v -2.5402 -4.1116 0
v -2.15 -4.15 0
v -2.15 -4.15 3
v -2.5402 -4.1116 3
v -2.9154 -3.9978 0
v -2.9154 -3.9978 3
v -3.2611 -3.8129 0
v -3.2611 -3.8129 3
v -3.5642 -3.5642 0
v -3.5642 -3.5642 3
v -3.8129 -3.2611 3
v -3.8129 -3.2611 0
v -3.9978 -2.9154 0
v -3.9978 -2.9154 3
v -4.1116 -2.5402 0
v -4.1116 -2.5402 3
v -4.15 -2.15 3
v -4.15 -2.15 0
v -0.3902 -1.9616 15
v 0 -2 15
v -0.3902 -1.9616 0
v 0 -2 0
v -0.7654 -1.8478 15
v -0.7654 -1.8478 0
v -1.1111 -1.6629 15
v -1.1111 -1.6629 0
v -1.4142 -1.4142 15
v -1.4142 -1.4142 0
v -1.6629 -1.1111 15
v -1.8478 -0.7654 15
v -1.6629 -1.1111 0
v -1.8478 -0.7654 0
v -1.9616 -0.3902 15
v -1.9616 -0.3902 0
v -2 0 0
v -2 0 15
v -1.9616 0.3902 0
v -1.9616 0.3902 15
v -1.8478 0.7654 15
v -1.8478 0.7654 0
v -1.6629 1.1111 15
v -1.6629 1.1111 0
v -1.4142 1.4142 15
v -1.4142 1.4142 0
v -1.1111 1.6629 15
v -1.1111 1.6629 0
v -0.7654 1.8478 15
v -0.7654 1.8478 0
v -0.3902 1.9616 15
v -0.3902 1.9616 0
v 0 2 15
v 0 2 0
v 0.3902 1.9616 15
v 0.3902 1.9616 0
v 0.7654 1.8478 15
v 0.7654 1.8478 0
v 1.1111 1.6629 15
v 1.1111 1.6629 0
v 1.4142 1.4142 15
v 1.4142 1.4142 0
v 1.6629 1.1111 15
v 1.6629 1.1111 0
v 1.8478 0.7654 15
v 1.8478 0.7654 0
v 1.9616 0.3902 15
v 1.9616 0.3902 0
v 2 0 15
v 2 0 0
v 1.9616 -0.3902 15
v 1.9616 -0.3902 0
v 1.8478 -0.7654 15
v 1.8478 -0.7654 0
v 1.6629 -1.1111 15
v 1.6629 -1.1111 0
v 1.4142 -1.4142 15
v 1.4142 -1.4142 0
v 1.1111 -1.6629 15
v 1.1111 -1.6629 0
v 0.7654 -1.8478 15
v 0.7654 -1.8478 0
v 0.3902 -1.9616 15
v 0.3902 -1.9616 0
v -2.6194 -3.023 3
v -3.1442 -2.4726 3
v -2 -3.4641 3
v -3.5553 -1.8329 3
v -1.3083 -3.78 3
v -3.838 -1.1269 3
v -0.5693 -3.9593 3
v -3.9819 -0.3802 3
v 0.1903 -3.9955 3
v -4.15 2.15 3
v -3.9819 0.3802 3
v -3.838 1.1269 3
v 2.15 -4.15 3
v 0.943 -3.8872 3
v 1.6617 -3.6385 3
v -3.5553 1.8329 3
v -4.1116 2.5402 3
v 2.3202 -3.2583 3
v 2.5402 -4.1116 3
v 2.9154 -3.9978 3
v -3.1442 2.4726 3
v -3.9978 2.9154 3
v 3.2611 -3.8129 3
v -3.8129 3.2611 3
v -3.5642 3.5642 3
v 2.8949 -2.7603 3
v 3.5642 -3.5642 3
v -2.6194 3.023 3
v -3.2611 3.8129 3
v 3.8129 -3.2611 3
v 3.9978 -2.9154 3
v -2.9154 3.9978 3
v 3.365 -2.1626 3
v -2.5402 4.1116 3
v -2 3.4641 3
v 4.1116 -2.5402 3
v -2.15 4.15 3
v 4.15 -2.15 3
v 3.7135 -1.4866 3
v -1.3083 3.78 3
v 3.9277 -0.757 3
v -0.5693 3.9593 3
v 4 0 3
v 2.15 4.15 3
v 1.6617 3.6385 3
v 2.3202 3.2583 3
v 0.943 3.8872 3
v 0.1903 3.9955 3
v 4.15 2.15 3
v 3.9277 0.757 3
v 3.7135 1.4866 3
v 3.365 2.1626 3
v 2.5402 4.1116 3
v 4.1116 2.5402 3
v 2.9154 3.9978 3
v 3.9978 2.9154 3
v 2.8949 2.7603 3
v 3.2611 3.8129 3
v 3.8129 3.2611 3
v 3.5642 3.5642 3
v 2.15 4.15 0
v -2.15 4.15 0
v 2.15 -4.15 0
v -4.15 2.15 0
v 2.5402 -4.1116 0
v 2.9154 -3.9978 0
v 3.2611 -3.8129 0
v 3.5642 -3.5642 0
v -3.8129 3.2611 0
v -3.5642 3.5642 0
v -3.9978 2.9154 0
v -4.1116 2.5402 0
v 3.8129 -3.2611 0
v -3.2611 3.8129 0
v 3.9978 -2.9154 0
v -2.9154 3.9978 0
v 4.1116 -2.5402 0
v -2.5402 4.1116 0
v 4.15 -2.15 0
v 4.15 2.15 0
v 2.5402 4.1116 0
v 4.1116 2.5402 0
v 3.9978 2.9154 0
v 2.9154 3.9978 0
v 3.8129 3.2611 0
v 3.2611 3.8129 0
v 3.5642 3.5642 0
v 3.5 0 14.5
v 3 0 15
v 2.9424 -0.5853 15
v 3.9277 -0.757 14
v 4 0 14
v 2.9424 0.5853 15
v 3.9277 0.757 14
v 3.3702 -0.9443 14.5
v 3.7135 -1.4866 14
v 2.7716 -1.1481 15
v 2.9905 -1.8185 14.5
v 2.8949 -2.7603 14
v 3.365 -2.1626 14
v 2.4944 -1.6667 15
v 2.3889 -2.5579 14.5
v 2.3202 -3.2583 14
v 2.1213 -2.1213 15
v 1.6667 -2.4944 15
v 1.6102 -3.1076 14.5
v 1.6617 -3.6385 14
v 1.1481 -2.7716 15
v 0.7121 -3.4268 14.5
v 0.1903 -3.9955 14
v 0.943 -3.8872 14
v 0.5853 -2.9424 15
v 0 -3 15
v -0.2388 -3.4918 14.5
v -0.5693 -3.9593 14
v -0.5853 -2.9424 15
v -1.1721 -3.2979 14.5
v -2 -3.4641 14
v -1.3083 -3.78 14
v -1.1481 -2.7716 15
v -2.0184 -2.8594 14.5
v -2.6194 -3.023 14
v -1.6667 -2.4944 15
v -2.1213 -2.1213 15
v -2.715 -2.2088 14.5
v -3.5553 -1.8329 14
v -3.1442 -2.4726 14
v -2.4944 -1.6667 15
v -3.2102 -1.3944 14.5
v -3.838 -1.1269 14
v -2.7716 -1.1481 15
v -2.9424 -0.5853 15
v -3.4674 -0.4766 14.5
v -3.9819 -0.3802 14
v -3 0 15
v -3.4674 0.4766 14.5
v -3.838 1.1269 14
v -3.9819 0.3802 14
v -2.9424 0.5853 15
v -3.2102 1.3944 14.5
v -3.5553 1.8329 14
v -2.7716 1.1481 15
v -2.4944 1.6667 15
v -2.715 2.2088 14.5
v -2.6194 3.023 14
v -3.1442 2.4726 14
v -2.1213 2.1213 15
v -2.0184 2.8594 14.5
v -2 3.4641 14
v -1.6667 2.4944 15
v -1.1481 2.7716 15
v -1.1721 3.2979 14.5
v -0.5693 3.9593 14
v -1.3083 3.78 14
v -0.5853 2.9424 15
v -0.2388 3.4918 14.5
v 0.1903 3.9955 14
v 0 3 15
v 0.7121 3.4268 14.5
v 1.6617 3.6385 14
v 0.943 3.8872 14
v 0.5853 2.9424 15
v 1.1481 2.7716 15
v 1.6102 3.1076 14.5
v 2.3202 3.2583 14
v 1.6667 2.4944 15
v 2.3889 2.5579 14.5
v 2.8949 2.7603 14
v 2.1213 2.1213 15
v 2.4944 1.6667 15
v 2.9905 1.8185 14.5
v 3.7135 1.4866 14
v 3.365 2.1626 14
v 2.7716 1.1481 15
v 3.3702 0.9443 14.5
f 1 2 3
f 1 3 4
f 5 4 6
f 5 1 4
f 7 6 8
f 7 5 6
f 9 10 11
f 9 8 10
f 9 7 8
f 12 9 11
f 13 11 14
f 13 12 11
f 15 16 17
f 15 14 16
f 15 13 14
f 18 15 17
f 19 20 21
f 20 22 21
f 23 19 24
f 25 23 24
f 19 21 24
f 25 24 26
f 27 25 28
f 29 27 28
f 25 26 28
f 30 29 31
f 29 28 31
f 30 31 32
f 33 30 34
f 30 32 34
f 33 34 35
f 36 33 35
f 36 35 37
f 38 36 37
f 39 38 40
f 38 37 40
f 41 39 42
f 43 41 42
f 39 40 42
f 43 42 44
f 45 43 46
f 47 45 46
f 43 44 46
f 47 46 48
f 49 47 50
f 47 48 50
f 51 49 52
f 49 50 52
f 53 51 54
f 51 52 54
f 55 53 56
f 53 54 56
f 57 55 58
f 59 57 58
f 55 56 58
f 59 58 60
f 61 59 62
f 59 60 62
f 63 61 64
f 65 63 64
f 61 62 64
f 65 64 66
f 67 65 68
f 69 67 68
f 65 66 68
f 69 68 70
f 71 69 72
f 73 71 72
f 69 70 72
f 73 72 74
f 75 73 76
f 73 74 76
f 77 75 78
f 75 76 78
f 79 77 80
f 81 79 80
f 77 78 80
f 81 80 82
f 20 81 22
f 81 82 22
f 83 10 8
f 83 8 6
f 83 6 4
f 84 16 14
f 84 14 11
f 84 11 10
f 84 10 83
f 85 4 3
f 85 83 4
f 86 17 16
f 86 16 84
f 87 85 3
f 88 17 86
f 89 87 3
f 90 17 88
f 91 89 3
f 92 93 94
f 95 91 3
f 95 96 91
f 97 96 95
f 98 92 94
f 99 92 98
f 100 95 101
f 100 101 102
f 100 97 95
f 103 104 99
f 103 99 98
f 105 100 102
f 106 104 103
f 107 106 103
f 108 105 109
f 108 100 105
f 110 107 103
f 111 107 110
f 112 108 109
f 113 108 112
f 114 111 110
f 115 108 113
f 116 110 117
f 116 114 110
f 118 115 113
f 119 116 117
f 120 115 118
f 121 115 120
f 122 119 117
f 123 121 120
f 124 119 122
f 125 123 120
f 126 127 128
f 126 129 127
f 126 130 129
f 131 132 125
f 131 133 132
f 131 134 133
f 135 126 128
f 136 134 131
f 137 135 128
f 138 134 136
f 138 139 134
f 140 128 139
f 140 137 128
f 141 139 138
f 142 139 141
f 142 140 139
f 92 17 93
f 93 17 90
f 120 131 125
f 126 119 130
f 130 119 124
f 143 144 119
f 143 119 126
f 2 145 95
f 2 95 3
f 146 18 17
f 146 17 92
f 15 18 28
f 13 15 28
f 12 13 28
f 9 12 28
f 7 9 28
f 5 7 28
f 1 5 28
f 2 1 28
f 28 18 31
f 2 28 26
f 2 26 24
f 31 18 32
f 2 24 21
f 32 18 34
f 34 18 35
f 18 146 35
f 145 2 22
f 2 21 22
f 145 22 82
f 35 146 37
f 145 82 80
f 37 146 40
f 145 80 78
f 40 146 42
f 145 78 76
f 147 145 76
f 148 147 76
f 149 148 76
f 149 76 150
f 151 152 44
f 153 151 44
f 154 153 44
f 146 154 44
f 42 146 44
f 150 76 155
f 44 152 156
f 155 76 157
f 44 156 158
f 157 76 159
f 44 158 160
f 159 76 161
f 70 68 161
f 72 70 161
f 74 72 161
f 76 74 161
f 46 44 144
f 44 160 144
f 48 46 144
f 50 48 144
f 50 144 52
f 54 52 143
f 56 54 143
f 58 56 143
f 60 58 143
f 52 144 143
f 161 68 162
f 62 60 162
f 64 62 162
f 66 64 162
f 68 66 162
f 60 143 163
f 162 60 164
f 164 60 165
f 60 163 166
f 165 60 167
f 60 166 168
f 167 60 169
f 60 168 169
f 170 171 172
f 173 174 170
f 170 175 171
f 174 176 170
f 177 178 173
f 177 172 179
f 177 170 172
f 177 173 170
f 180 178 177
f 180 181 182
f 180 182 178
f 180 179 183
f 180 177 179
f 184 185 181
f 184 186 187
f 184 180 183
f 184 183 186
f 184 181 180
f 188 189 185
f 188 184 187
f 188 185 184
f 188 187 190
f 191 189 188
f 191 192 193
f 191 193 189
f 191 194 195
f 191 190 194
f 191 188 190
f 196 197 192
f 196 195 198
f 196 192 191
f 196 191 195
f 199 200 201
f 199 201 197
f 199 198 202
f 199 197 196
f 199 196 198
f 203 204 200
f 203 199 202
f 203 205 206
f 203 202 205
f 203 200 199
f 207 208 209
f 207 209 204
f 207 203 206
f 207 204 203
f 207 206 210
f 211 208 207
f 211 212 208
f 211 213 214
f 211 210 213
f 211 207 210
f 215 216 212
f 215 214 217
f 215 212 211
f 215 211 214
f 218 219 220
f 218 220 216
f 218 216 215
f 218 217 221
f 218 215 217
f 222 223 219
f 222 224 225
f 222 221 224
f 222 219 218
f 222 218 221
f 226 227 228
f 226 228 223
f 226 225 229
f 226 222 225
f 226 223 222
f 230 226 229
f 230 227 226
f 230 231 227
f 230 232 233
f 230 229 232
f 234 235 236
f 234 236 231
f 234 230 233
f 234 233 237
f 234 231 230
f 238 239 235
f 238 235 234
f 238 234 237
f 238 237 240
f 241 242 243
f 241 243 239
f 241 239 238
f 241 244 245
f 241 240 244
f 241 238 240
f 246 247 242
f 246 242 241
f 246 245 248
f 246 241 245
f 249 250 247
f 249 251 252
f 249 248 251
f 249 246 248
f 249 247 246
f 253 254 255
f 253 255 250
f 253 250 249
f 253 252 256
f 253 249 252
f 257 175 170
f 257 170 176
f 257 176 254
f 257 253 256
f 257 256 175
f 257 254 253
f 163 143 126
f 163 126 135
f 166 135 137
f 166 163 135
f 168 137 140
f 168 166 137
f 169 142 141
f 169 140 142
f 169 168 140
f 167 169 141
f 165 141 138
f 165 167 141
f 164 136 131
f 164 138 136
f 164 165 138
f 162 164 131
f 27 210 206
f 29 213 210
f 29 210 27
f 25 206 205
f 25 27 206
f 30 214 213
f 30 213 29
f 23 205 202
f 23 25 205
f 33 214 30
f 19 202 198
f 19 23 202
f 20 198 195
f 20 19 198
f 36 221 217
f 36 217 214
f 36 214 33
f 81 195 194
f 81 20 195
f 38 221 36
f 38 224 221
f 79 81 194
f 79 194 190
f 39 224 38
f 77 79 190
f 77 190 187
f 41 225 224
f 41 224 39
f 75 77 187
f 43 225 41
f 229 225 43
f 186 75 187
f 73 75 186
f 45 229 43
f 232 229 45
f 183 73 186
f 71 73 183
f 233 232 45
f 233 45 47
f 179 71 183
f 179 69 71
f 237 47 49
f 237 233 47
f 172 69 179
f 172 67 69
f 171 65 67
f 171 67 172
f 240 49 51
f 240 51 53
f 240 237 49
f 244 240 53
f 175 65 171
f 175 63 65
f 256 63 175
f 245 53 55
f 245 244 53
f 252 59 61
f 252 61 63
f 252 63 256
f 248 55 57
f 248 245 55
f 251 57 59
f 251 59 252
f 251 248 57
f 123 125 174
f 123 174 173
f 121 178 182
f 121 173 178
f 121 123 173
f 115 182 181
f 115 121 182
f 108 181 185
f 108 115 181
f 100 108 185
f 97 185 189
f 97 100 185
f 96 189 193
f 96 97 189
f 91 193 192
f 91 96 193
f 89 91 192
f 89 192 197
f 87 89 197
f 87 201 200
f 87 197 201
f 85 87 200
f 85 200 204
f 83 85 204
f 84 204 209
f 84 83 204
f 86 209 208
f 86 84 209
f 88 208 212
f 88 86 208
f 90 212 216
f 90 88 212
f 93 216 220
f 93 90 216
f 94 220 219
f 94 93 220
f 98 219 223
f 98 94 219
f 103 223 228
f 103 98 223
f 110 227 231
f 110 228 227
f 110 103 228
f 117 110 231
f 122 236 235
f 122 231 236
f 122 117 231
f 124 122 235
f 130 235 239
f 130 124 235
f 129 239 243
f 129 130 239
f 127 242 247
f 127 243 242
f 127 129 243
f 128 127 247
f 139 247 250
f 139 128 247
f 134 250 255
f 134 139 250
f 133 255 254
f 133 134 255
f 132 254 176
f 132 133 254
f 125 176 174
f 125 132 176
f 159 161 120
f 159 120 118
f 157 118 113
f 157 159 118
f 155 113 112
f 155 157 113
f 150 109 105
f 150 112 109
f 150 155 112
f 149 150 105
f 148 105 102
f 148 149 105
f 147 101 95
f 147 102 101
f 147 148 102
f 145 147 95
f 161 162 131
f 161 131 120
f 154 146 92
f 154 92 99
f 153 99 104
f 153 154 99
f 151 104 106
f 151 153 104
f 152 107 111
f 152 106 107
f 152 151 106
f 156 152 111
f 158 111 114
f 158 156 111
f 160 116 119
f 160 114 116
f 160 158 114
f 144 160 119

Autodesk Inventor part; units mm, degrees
ref_plane "YZ Plane" through (0, 0, 0) normal (1, 0, 0) x (0, 1, 0)
ref_plane "XZ Plane" through (0, 0, 0) normal (0, 1, 0) x (-1, 0, 0)
ref_plane "XY Plane" through (0, 0, 0) normal (0, 0, 1) x (1, 0, 0)
sketch "Skizze1" plane through (0, 0, 0) normal (0, 0, 1) x (1, 0, 0)
  line L0 (-2.15, 4.15) -> (2.15, 4.15)
  line L1 (4.15, 2.15) -> (4.15, -2.15)
  line L2 (2.15, -4.15) -> (-2.15, -4.15)
  line L3 (-4.15, -2.15) -> (-4.15, 2.15)
  arc A0 (-2.15, 4.15) -> (-4.15, 2.15) centre (-2.15, 2.15) ccw
  arc A1 (4.15, 2.15) -> (2.15, 4.15) centre (2.15, 2.15) ccw
  arc A2 (2.15, -4.15) -> (4.15, -2.15) centre (2.15, -2.15) ccw
  arc A3 (-4.15, -2.15) -> (-2.15, -4.15) centre (-2.15, -2.15) ccw
  line L4 (-2.15, 2.15) -> (2.15, -2.15) construction
  line L5 (2.15, 2.15) -> (-2.15, -2.15) construction
  point P0 (0, 0)
  dimension "d0" = 2
  dimension "d1" = 8.3
extrude "Extrusion1" add sketch "Skizze1" along normal blind 3
sketch "Skizze2" plane through (0, 0, 3) normal (0, 0, 1) x (1, 0, 0)
  circle A0 centre (0, 0) radius 4
  dimension "d4" = 8
extrude "Extrusion2" add sketch "Skizze2" along normal blind 12
thread "Gewinde1" size "M8x1.25" class "6g" standard "ANSI Metric M Profile" length 8 offset 4
sketch "Skizze3" plane through (0, 0, 15) normal (0, 0, 1) x (1, 0, 0)
  point P0 (0, 0)
  point P1 (0, 0)
hole "Bohrung1" at (0, 0, 15) direction (0, 0, -1) diameter 4 end through all
chamfer "Fase1" distance 1 angle 45 1 edges at (-4, 0, 15)
properties part number "Radadapter" material "Aluminium 6061"
